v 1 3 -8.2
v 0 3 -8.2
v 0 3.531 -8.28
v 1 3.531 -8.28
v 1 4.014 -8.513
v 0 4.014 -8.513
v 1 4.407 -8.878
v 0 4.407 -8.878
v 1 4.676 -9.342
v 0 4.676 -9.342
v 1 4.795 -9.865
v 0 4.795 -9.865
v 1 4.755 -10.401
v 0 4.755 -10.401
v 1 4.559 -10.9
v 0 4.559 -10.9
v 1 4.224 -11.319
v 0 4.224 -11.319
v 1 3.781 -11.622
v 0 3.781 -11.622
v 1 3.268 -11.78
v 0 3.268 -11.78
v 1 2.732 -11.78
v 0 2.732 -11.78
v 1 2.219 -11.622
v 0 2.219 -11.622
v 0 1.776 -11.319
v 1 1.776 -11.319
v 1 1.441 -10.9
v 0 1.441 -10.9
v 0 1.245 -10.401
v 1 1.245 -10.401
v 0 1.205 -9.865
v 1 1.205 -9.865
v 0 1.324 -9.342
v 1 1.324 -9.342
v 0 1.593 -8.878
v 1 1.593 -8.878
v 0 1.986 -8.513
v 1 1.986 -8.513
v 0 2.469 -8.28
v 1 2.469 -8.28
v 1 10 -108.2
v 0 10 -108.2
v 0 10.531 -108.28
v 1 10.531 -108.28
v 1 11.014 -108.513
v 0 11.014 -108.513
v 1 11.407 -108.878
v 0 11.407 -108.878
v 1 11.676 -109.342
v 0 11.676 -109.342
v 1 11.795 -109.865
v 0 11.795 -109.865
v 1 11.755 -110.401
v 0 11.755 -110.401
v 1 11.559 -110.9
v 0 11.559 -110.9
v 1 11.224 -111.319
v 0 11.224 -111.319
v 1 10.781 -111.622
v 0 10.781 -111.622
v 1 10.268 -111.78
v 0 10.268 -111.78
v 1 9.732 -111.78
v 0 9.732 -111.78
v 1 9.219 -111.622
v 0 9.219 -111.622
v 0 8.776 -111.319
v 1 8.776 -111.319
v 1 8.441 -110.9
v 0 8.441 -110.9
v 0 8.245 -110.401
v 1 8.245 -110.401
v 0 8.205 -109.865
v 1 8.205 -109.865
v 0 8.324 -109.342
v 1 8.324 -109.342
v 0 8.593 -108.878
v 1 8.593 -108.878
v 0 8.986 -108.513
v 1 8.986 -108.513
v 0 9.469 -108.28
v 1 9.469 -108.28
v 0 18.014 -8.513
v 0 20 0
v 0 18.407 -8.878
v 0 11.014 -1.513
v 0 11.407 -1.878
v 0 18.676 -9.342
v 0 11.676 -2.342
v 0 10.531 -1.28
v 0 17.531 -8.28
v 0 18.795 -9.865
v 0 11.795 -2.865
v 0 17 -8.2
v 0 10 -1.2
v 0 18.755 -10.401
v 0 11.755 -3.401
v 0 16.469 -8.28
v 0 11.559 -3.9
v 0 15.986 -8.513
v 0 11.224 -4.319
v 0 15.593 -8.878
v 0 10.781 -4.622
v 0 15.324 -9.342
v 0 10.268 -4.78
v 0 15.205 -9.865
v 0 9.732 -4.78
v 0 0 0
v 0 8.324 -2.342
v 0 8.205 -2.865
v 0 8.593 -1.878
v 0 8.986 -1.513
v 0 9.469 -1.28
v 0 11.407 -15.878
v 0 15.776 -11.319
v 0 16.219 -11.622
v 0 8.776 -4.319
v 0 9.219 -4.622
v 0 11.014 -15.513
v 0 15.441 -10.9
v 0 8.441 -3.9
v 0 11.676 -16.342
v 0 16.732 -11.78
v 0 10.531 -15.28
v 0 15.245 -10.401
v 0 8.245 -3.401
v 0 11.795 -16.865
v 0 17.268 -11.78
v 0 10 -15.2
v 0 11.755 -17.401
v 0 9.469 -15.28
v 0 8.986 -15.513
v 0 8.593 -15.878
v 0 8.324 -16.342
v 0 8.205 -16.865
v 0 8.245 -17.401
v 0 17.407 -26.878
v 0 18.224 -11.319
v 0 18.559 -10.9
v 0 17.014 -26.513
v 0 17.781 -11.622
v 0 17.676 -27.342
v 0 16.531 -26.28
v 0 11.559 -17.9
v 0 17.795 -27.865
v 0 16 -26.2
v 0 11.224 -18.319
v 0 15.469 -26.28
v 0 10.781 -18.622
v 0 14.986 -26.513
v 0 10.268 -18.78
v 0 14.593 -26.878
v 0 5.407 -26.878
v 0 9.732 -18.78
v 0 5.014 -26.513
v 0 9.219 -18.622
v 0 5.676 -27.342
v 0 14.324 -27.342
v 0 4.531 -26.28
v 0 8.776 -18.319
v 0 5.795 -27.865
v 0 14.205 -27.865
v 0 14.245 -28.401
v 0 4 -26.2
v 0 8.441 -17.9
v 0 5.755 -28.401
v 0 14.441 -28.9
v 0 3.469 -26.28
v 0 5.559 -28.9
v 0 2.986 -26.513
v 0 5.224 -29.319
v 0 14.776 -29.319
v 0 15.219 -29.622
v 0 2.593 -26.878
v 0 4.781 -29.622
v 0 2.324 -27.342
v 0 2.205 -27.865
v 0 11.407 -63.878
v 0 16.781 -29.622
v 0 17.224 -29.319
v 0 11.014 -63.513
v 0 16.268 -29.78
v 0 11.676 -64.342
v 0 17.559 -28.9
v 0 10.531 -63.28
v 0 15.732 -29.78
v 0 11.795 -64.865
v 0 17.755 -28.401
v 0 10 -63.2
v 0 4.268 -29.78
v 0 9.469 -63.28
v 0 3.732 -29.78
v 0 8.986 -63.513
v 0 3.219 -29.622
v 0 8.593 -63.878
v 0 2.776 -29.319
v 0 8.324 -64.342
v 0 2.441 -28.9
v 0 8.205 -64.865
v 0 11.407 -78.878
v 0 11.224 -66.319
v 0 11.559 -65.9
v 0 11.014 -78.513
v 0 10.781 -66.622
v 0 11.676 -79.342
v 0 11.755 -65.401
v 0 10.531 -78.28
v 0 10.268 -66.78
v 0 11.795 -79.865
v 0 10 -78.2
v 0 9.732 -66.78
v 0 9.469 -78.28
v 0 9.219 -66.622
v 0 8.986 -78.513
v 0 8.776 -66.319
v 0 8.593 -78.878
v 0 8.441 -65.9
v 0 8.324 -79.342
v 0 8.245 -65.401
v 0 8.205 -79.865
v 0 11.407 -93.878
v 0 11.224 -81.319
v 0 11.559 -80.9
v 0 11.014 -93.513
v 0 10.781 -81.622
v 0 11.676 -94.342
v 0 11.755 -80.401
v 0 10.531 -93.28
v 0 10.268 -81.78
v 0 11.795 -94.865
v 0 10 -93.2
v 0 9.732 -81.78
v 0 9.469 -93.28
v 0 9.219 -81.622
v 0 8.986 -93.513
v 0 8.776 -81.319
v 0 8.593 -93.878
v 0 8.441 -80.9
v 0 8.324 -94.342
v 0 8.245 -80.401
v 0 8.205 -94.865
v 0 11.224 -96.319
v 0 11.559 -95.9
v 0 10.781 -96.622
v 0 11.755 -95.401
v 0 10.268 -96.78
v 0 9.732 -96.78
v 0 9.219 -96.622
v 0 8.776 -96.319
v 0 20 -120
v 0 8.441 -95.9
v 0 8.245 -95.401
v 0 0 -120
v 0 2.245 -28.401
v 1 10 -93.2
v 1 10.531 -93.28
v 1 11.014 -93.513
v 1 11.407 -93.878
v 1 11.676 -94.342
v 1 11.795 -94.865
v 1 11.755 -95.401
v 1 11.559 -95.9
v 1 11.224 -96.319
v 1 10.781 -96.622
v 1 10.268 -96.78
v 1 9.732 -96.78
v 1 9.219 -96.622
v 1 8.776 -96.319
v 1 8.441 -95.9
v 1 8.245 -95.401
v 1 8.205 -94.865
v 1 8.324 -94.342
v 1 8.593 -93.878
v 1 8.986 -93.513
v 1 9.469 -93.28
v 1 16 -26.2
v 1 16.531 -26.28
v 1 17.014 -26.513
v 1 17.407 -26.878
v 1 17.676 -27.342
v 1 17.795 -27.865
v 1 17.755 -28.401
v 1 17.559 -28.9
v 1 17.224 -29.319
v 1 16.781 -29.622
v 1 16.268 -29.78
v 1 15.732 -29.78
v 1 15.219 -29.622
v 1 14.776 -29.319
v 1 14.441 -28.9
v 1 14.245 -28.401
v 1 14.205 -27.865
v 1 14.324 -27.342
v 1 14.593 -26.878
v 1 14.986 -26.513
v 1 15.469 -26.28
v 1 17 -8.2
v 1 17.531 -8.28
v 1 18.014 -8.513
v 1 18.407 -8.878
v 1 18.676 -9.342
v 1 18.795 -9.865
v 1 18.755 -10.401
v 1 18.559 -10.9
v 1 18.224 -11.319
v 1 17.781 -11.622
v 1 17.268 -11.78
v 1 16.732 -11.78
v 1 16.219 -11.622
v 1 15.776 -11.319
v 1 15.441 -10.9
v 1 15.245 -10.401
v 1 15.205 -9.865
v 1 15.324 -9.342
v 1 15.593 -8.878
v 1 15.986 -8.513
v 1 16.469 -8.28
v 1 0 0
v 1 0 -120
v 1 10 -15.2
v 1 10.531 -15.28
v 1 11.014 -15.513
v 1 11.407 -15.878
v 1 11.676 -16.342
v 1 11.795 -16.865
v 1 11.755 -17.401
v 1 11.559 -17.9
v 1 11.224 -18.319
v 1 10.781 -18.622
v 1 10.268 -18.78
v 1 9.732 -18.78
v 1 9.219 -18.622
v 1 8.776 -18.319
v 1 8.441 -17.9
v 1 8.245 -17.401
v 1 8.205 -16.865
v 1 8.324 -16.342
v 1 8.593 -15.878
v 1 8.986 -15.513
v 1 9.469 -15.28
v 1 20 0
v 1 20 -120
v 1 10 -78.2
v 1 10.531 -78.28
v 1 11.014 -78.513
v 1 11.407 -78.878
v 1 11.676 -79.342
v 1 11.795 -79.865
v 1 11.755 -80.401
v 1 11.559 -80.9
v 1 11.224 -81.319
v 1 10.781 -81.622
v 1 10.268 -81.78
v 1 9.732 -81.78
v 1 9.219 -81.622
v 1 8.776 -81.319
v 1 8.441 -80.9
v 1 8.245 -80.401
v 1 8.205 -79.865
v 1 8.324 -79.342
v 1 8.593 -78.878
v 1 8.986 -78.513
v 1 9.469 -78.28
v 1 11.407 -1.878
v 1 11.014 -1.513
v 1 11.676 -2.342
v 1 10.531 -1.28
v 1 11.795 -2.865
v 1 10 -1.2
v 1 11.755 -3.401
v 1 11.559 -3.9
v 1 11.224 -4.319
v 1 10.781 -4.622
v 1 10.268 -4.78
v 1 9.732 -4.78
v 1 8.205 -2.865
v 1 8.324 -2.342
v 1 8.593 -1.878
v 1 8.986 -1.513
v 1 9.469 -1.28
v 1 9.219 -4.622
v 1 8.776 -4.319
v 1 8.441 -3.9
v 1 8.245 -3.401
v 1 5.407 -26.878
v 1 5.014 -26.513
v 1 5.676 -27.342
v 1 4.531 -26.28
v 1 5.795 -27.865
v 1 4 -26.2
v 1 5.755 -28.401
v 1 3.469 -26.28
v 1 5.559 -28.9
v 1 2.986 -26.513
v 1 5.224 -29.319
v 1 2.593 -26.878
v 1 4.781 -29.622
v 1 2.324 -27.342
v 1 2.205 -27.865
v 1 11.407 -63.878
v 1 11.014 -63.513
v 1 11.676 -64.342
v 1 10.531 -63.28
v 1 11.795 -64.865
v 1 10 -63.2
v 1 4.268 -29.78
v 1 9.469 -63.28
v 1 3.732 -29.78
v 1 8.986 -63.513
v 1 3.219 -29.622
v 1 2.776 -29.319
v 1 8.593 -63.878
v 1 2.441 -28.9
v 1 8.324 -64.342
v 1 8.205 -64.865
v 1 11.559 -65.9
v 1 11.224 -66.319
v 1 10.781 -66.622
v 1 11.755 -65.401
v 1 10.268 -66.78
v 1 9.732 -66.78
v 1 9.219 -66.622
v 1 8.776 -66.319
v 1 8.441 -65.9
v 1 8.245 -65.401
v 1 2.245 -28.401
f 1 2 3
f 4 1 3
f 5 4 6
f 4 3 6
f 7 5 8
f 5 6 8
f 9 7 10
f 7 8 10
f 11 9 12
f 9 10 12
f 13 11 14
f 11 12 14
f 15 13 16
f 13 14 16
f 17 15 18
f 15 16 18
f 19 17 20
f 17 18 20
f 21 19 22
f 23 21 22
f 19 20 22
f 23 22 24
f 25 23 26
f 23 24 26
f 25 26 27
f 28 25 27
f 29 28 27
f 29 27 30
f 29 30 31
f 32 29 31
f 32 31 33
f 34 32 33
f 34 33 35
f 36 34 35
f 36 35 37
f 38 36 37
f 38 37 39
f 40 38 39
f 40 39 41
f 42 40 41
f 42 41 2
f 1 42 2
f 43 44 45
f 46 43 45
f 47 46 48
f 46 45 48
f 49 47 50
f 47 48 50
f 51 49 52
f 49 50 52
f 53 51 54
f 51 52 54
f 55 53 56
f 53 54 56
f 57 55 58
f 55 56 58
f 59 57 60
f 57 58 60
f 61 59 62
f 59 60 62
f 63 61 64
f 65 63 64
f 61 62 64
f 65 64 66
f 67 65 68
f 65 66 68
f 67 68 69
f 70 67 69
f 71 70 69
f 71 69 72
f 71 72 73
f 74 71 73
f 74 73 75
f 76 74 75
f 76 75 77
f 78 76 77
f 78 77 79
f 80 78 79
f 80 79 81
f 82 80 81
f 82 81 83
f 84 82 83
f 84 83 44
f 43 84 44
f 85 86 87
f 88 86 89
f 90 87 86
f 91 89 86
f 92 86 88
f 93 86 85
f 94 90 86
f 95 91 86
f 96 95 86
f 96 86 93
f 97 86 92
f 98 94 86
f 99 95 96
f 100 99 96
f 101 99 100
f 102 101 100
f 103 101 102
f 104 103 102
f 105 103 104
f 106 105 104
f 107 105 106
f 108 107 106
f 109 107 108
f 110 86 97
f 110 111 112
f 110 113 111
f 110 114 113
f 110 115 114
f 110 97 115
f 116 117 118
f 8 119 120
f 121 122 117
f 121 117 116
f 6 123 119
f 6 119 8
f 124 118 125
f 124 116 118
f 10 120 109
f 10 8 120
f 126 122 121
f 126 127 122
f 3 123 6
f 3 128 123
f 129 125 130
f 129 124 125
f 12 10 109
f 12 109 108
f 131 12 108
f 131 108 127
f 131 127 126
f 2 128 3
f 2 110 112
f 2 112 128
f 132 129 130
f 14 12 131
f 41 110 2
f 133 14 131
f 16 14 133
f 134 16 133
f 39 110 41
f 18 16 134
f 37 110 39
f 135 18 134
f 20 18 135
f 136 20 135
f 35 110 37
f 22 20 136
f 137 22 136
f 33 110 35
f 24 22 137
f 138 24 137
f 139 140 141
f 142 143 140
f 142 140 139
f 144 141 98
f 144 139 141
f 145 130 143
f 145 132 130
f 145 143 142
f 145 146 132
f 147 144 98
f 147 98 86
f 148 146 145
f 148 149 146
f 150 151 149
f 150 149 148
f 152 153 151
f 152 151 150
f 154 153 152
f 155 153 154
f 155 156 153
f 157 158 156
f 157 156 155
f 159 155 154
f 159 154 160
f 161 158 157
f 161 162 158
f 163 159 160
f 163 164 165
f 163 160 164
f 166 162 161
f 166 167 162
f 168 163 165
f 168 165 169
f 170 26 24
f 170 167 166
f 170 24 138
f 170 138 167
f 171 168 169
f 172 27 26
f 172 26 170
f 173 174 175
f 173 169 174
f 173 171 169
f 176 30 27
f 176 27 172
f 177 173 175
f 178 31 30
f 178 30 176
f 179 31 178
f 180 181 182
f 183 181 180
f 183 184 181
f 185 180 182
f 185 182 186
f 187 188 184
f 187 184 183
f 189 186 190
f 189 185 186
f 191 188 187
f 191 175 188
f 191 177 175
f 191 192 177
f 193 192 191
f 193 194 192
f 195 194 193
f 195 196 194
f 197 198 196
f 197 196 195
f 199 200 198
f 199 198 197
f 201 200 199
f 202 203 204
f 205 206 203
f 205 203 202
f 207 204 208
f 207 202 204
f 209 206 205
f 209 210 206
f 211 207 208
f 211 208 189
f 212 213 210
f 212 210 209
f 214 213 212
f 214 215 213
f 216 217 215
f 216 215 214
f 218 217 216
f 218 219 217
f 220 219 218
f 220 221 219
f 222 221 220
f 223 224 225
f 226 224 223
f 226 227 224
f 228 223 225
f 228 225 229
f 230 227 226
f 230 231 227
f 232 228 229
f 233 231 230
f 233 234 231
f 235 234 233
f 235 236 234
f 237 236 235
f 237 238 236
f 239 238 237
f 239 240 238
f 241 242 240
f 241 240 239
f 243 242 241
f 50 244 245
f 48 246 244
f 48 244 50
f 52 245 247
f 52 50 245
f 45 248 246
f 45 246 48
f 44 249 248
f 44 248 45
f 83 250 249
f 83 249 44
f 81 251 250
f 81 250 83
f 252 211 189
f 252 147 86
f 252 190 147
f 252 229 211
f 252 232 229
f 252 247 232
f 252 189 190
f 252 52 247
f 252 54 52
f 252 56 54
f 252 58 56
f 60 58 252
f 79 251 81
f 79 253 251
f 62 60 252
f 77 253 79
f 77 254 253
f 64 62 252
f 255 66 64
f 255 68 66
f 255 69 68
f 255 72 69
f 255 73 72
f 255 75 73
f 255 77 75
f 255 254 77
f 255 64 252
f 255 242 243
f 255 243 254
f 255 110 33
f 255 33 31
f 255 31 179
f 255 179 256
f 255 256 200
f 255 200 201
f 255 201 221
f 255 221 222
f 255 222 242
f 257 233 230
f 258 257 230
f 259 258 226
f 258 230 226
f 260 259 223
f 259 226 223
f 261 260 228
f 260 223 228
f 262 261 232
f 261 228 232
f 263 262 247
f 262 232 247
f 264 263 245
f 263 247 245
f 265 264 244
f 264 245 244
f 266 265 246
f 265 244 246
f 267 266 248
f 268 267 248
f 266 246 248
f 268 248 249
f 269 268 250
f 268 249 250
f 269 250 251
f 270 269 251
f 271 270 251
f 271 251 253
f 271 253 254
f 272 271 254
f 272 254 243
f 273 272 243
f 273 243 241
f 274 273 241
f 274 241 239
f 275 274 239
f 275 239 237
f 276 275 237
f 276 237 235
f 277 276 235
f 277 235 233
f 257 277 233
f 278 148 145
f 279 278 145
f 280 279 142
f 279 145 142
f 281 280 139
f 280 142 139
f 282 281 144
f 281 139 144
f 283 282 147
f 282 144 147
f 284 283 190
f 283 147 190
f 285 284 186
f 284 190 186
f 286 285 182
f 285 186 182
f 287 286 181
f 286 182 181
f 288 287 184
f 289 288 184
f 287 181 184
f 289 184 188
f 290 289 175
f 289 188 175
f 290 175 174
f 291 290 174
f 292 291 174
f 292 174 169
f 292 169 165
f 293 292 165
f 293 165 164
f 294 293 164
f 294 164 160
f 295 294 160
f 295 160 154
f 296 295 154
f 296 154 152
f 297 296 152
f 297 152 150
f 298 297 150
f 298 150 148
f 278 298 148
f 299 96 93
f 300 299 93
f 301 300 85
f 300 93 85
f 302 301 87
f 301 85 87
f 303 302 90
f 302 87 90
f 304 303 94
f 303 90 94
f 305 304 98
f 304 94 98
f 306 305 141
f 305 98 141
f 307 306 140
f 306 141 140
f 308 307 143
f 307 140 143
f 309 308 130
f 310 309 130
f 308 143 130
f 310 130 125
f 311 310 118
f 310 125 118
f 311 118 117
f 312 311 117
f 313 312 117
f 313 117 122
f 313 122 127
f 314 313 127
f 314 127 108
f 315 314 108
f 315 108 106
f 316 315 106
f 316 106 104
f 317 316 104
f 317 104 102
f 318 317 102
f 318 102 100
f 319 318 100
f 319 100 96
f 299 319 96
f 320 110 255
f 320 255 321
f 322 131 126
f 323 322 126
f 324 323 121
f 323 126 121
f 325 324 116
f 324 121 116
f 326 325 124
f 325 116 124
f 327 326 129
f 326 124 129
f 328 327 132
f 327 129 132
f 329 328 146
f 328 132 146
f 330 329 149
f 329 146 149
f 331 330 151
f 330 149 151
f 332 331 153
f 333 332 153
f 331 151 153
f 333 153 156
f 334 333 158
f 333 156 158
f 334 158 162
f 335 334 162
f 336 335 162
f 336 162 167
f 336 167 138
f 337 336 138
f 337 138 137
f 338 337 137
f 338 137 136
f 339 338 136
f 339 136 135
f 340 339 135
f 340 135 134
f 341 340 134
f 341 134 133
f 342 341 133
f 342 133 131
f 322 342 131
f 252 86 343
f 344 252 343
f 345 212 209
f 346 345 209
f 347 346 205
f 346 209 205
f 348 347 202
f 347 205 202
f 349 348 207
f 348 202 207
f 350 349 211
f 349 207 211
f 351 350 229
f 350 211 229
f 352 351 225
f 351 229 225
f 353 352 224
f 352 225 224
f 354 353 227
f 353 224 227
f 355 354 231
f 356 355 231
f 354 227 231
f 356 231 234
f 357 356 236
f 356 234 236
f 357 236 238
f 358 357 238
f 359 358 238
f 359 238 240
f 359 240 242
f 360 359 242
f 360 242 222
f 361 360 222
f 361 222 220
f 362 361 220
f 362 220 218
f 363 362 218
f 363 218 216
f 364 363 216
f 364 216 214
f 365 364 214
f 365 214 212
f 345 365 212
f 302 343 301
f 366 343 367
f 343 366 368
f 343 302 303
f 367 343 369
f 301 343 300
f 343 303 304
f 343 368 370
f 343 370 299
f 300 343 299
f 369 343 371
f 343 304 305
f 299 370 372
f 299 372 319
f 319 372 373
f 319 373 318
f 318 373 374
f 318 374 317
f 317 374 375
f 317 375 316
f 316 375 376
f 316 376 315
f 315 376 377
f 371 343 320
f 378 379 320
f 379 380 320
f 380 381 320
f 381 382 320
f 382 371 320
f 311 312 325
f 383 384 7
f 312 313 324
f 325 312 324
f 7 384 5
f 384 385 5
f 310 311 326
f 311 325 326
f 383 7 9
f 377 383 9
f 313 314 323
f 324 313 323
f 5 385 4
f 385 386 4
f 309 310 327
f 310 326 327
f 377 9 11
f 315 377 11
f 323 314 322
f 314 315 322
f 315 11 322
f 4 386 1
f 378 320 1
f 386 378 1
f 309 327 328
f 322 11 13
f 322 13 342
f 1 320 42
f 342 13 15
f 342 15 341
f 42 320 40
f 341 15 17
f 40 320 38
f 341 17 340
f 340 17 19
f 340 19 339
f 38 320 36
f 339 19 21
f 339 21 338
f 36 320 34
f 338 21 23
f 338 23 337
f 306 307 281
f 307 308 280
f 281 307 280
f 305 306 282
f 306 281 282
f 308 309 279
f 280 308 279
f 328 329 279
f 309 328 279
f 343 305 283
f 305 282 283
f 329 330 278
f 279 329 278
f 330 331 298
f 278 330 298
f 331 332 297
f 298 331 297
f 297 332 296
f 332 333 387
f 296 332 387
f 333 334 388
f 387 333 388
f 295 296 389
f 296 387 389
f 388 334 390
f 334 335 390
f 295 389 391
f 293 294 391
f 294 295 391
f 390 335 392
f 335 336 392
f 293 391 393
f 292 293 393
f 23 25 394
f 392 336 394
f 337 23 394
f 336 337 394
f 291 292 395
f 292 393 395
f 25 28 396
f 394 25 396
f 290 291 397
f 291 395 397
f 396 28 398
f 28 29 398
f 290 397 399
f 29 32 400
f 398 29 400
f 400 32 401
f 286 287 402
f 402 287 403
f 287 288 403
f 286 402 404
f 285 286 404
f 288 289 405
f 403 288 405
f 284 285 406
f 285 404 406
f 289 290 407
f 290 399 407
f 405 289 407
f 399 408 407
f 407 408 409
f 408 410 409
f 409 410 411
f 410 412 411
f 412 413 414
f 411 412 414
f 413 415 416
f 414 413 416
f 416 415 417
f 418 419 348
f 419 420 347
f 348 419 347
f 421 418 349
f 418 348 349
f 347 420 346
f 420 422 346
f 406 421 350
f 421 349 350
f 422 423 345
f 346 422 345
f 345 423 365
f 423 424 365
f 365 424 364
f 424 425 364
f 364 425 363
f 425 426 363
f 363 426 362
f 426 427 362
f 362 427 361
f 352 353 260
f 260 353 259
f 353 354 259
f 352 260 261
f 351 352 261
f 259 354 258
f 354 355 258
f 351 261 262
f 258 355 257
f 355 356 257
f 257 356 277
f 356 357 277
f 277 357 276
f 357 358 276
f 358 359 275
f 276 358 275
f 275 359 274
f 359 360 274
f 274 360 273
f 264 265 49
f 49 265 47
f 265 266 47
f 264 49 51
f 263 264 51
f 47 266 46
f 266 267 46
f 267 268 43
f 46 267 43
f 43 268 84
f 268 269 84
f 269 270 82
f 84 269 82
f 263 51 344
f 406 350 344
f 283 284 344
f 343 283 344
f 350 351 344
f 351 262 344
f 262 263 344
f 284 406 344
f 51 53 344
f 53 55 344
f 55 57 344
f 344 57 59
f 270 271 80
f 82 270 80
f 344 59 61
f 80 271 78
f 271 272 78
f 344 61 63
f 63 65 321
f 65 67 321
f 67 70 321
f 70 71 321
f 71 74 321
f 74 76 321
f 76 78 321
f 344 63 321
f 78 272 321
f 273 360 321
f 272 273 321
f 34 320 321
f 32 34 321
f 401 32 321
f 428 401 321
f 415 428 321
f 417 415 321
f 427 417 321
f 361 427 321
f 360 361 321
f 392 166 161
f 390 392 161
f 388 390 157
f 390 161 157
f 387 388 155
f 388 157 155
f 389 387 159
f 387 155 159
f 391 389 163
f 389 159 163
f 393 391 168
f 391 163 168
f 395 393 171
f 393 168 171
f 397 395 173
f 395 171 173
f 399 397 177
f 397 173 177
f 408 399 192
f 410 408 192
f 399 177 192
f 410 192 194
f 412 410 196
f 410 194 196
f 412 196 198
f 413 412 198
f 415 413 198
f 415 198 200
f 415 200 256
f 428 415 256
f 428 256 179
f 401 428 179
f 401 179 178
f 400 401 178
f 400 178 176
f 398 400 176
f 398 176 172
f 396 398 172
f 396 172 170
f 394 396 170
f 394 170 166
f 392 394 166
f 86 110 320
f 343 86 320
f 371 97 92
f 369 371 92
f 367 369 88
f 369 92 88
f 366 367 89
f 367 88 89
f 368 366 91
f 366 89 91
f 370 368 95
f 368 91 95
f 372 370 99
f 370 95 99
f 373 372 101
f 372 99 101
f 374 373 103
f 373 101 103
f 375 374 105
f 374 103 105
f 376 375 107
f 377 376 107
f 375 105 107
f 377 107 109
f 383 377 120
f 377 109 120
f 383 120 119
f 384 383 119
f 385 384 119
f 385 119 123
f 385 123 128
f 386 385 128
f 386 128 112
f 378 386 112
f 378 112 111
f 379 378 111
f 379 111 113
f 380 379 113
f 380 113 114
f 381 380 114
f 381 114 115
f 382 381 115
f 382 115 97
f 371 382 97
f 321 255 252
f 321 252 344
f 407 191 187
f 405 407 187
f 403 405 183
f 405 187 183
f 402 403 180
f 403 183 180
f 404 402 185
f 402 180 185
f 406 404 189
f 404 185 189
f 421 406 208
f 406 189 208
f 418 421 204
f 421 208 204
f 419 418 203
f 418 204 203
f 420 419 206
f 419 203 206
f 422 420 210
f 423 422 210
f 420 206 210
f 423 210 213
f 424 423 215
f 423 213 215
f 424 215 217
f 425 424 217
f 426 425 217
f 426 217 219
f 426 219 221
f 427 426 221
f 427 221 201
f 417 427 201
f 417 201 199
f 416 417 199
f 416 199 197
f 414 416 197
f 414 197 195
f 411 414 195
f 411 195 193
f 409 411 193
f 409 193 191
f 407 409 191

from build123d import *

# Parameters (mm, degrees)
SKETCH_1_W          = 1
SKETCH_1_H          = 120
EXTRUDE_1_DEPTH     = 20
SKETCH_2_R          = 1.8
CUT_EXTRUDE_1_DEPTH = 122.659360511
SKETCH_3_R          = 1.8
CUT_EXTRUDE_3_DEPTH = 10
SKETCH_4_R          = 1.8
CUT_EXTRUDE_4_DEPTH = 122.659360511


with BuildPart() as part:
    # 草图1 → 凸台-拉伸1 (new body)
    with BuildSketch(Plane(origin=(0, 0, 0), x_dir=(1, 0, 0), z_dir=(0, 1, 0))):
        with Locations((0.5, 60)):
            Rectangle(SKETCH_1_W, SKETCH_1_H)
    extrude(amount=EXTRUDE_1_DEPTH)

    # 草图2 → 切除-拉伸1 (cut, through all)
    with BuildSketch(Plane.ZY):
        with Locations((-10, 17)):
            Circle(SKETCH_2_R)
        with Locations((-17, 10)):
            Circle(SKETCH_2_R)
        with Locations((-3, 10)):
            Circle(SKETCH_2_R)
        with Locations((-10, 3)):
            Circle(SKETCH_2_R)
    extrude(amount=-CUT_EXTRUDE_1_DEPTH, mode=Mode.SUBTRACT)

    # 草图3 → 切除-拉伸3 (cut)
    with BuildSketch(Plane.ZY):
        with Locations((-110, 10)):
            Circle(SKETCH_3_R)
        with Locations((-95, 10)):
            Circle(SKETCH_3_R)
        with Locations((-80, 10)):
            Circle(SKETCH_3_R)
        with Locations((-65, 10)):
            Circle(SKETCH_3_R)
    extrude(amount=-CUT_EXTRUDE_3_DEPTH, mode=Mode.SUBTRACT)

    # 草图4 → 切除-拉伸4 (cut, through all)
    with BuildSketch(Plane.ZY):
        with Locations((-28, 16)):
            Circle(SKETCH_4_R)
        with Locations((-28, 4)):
            Circle(SKETCH_4_R)
    extrude(amount=-CUT_EXTRUDE_4_DEPTH, mode=Mode.SUBTRACT)


solid = part.part
